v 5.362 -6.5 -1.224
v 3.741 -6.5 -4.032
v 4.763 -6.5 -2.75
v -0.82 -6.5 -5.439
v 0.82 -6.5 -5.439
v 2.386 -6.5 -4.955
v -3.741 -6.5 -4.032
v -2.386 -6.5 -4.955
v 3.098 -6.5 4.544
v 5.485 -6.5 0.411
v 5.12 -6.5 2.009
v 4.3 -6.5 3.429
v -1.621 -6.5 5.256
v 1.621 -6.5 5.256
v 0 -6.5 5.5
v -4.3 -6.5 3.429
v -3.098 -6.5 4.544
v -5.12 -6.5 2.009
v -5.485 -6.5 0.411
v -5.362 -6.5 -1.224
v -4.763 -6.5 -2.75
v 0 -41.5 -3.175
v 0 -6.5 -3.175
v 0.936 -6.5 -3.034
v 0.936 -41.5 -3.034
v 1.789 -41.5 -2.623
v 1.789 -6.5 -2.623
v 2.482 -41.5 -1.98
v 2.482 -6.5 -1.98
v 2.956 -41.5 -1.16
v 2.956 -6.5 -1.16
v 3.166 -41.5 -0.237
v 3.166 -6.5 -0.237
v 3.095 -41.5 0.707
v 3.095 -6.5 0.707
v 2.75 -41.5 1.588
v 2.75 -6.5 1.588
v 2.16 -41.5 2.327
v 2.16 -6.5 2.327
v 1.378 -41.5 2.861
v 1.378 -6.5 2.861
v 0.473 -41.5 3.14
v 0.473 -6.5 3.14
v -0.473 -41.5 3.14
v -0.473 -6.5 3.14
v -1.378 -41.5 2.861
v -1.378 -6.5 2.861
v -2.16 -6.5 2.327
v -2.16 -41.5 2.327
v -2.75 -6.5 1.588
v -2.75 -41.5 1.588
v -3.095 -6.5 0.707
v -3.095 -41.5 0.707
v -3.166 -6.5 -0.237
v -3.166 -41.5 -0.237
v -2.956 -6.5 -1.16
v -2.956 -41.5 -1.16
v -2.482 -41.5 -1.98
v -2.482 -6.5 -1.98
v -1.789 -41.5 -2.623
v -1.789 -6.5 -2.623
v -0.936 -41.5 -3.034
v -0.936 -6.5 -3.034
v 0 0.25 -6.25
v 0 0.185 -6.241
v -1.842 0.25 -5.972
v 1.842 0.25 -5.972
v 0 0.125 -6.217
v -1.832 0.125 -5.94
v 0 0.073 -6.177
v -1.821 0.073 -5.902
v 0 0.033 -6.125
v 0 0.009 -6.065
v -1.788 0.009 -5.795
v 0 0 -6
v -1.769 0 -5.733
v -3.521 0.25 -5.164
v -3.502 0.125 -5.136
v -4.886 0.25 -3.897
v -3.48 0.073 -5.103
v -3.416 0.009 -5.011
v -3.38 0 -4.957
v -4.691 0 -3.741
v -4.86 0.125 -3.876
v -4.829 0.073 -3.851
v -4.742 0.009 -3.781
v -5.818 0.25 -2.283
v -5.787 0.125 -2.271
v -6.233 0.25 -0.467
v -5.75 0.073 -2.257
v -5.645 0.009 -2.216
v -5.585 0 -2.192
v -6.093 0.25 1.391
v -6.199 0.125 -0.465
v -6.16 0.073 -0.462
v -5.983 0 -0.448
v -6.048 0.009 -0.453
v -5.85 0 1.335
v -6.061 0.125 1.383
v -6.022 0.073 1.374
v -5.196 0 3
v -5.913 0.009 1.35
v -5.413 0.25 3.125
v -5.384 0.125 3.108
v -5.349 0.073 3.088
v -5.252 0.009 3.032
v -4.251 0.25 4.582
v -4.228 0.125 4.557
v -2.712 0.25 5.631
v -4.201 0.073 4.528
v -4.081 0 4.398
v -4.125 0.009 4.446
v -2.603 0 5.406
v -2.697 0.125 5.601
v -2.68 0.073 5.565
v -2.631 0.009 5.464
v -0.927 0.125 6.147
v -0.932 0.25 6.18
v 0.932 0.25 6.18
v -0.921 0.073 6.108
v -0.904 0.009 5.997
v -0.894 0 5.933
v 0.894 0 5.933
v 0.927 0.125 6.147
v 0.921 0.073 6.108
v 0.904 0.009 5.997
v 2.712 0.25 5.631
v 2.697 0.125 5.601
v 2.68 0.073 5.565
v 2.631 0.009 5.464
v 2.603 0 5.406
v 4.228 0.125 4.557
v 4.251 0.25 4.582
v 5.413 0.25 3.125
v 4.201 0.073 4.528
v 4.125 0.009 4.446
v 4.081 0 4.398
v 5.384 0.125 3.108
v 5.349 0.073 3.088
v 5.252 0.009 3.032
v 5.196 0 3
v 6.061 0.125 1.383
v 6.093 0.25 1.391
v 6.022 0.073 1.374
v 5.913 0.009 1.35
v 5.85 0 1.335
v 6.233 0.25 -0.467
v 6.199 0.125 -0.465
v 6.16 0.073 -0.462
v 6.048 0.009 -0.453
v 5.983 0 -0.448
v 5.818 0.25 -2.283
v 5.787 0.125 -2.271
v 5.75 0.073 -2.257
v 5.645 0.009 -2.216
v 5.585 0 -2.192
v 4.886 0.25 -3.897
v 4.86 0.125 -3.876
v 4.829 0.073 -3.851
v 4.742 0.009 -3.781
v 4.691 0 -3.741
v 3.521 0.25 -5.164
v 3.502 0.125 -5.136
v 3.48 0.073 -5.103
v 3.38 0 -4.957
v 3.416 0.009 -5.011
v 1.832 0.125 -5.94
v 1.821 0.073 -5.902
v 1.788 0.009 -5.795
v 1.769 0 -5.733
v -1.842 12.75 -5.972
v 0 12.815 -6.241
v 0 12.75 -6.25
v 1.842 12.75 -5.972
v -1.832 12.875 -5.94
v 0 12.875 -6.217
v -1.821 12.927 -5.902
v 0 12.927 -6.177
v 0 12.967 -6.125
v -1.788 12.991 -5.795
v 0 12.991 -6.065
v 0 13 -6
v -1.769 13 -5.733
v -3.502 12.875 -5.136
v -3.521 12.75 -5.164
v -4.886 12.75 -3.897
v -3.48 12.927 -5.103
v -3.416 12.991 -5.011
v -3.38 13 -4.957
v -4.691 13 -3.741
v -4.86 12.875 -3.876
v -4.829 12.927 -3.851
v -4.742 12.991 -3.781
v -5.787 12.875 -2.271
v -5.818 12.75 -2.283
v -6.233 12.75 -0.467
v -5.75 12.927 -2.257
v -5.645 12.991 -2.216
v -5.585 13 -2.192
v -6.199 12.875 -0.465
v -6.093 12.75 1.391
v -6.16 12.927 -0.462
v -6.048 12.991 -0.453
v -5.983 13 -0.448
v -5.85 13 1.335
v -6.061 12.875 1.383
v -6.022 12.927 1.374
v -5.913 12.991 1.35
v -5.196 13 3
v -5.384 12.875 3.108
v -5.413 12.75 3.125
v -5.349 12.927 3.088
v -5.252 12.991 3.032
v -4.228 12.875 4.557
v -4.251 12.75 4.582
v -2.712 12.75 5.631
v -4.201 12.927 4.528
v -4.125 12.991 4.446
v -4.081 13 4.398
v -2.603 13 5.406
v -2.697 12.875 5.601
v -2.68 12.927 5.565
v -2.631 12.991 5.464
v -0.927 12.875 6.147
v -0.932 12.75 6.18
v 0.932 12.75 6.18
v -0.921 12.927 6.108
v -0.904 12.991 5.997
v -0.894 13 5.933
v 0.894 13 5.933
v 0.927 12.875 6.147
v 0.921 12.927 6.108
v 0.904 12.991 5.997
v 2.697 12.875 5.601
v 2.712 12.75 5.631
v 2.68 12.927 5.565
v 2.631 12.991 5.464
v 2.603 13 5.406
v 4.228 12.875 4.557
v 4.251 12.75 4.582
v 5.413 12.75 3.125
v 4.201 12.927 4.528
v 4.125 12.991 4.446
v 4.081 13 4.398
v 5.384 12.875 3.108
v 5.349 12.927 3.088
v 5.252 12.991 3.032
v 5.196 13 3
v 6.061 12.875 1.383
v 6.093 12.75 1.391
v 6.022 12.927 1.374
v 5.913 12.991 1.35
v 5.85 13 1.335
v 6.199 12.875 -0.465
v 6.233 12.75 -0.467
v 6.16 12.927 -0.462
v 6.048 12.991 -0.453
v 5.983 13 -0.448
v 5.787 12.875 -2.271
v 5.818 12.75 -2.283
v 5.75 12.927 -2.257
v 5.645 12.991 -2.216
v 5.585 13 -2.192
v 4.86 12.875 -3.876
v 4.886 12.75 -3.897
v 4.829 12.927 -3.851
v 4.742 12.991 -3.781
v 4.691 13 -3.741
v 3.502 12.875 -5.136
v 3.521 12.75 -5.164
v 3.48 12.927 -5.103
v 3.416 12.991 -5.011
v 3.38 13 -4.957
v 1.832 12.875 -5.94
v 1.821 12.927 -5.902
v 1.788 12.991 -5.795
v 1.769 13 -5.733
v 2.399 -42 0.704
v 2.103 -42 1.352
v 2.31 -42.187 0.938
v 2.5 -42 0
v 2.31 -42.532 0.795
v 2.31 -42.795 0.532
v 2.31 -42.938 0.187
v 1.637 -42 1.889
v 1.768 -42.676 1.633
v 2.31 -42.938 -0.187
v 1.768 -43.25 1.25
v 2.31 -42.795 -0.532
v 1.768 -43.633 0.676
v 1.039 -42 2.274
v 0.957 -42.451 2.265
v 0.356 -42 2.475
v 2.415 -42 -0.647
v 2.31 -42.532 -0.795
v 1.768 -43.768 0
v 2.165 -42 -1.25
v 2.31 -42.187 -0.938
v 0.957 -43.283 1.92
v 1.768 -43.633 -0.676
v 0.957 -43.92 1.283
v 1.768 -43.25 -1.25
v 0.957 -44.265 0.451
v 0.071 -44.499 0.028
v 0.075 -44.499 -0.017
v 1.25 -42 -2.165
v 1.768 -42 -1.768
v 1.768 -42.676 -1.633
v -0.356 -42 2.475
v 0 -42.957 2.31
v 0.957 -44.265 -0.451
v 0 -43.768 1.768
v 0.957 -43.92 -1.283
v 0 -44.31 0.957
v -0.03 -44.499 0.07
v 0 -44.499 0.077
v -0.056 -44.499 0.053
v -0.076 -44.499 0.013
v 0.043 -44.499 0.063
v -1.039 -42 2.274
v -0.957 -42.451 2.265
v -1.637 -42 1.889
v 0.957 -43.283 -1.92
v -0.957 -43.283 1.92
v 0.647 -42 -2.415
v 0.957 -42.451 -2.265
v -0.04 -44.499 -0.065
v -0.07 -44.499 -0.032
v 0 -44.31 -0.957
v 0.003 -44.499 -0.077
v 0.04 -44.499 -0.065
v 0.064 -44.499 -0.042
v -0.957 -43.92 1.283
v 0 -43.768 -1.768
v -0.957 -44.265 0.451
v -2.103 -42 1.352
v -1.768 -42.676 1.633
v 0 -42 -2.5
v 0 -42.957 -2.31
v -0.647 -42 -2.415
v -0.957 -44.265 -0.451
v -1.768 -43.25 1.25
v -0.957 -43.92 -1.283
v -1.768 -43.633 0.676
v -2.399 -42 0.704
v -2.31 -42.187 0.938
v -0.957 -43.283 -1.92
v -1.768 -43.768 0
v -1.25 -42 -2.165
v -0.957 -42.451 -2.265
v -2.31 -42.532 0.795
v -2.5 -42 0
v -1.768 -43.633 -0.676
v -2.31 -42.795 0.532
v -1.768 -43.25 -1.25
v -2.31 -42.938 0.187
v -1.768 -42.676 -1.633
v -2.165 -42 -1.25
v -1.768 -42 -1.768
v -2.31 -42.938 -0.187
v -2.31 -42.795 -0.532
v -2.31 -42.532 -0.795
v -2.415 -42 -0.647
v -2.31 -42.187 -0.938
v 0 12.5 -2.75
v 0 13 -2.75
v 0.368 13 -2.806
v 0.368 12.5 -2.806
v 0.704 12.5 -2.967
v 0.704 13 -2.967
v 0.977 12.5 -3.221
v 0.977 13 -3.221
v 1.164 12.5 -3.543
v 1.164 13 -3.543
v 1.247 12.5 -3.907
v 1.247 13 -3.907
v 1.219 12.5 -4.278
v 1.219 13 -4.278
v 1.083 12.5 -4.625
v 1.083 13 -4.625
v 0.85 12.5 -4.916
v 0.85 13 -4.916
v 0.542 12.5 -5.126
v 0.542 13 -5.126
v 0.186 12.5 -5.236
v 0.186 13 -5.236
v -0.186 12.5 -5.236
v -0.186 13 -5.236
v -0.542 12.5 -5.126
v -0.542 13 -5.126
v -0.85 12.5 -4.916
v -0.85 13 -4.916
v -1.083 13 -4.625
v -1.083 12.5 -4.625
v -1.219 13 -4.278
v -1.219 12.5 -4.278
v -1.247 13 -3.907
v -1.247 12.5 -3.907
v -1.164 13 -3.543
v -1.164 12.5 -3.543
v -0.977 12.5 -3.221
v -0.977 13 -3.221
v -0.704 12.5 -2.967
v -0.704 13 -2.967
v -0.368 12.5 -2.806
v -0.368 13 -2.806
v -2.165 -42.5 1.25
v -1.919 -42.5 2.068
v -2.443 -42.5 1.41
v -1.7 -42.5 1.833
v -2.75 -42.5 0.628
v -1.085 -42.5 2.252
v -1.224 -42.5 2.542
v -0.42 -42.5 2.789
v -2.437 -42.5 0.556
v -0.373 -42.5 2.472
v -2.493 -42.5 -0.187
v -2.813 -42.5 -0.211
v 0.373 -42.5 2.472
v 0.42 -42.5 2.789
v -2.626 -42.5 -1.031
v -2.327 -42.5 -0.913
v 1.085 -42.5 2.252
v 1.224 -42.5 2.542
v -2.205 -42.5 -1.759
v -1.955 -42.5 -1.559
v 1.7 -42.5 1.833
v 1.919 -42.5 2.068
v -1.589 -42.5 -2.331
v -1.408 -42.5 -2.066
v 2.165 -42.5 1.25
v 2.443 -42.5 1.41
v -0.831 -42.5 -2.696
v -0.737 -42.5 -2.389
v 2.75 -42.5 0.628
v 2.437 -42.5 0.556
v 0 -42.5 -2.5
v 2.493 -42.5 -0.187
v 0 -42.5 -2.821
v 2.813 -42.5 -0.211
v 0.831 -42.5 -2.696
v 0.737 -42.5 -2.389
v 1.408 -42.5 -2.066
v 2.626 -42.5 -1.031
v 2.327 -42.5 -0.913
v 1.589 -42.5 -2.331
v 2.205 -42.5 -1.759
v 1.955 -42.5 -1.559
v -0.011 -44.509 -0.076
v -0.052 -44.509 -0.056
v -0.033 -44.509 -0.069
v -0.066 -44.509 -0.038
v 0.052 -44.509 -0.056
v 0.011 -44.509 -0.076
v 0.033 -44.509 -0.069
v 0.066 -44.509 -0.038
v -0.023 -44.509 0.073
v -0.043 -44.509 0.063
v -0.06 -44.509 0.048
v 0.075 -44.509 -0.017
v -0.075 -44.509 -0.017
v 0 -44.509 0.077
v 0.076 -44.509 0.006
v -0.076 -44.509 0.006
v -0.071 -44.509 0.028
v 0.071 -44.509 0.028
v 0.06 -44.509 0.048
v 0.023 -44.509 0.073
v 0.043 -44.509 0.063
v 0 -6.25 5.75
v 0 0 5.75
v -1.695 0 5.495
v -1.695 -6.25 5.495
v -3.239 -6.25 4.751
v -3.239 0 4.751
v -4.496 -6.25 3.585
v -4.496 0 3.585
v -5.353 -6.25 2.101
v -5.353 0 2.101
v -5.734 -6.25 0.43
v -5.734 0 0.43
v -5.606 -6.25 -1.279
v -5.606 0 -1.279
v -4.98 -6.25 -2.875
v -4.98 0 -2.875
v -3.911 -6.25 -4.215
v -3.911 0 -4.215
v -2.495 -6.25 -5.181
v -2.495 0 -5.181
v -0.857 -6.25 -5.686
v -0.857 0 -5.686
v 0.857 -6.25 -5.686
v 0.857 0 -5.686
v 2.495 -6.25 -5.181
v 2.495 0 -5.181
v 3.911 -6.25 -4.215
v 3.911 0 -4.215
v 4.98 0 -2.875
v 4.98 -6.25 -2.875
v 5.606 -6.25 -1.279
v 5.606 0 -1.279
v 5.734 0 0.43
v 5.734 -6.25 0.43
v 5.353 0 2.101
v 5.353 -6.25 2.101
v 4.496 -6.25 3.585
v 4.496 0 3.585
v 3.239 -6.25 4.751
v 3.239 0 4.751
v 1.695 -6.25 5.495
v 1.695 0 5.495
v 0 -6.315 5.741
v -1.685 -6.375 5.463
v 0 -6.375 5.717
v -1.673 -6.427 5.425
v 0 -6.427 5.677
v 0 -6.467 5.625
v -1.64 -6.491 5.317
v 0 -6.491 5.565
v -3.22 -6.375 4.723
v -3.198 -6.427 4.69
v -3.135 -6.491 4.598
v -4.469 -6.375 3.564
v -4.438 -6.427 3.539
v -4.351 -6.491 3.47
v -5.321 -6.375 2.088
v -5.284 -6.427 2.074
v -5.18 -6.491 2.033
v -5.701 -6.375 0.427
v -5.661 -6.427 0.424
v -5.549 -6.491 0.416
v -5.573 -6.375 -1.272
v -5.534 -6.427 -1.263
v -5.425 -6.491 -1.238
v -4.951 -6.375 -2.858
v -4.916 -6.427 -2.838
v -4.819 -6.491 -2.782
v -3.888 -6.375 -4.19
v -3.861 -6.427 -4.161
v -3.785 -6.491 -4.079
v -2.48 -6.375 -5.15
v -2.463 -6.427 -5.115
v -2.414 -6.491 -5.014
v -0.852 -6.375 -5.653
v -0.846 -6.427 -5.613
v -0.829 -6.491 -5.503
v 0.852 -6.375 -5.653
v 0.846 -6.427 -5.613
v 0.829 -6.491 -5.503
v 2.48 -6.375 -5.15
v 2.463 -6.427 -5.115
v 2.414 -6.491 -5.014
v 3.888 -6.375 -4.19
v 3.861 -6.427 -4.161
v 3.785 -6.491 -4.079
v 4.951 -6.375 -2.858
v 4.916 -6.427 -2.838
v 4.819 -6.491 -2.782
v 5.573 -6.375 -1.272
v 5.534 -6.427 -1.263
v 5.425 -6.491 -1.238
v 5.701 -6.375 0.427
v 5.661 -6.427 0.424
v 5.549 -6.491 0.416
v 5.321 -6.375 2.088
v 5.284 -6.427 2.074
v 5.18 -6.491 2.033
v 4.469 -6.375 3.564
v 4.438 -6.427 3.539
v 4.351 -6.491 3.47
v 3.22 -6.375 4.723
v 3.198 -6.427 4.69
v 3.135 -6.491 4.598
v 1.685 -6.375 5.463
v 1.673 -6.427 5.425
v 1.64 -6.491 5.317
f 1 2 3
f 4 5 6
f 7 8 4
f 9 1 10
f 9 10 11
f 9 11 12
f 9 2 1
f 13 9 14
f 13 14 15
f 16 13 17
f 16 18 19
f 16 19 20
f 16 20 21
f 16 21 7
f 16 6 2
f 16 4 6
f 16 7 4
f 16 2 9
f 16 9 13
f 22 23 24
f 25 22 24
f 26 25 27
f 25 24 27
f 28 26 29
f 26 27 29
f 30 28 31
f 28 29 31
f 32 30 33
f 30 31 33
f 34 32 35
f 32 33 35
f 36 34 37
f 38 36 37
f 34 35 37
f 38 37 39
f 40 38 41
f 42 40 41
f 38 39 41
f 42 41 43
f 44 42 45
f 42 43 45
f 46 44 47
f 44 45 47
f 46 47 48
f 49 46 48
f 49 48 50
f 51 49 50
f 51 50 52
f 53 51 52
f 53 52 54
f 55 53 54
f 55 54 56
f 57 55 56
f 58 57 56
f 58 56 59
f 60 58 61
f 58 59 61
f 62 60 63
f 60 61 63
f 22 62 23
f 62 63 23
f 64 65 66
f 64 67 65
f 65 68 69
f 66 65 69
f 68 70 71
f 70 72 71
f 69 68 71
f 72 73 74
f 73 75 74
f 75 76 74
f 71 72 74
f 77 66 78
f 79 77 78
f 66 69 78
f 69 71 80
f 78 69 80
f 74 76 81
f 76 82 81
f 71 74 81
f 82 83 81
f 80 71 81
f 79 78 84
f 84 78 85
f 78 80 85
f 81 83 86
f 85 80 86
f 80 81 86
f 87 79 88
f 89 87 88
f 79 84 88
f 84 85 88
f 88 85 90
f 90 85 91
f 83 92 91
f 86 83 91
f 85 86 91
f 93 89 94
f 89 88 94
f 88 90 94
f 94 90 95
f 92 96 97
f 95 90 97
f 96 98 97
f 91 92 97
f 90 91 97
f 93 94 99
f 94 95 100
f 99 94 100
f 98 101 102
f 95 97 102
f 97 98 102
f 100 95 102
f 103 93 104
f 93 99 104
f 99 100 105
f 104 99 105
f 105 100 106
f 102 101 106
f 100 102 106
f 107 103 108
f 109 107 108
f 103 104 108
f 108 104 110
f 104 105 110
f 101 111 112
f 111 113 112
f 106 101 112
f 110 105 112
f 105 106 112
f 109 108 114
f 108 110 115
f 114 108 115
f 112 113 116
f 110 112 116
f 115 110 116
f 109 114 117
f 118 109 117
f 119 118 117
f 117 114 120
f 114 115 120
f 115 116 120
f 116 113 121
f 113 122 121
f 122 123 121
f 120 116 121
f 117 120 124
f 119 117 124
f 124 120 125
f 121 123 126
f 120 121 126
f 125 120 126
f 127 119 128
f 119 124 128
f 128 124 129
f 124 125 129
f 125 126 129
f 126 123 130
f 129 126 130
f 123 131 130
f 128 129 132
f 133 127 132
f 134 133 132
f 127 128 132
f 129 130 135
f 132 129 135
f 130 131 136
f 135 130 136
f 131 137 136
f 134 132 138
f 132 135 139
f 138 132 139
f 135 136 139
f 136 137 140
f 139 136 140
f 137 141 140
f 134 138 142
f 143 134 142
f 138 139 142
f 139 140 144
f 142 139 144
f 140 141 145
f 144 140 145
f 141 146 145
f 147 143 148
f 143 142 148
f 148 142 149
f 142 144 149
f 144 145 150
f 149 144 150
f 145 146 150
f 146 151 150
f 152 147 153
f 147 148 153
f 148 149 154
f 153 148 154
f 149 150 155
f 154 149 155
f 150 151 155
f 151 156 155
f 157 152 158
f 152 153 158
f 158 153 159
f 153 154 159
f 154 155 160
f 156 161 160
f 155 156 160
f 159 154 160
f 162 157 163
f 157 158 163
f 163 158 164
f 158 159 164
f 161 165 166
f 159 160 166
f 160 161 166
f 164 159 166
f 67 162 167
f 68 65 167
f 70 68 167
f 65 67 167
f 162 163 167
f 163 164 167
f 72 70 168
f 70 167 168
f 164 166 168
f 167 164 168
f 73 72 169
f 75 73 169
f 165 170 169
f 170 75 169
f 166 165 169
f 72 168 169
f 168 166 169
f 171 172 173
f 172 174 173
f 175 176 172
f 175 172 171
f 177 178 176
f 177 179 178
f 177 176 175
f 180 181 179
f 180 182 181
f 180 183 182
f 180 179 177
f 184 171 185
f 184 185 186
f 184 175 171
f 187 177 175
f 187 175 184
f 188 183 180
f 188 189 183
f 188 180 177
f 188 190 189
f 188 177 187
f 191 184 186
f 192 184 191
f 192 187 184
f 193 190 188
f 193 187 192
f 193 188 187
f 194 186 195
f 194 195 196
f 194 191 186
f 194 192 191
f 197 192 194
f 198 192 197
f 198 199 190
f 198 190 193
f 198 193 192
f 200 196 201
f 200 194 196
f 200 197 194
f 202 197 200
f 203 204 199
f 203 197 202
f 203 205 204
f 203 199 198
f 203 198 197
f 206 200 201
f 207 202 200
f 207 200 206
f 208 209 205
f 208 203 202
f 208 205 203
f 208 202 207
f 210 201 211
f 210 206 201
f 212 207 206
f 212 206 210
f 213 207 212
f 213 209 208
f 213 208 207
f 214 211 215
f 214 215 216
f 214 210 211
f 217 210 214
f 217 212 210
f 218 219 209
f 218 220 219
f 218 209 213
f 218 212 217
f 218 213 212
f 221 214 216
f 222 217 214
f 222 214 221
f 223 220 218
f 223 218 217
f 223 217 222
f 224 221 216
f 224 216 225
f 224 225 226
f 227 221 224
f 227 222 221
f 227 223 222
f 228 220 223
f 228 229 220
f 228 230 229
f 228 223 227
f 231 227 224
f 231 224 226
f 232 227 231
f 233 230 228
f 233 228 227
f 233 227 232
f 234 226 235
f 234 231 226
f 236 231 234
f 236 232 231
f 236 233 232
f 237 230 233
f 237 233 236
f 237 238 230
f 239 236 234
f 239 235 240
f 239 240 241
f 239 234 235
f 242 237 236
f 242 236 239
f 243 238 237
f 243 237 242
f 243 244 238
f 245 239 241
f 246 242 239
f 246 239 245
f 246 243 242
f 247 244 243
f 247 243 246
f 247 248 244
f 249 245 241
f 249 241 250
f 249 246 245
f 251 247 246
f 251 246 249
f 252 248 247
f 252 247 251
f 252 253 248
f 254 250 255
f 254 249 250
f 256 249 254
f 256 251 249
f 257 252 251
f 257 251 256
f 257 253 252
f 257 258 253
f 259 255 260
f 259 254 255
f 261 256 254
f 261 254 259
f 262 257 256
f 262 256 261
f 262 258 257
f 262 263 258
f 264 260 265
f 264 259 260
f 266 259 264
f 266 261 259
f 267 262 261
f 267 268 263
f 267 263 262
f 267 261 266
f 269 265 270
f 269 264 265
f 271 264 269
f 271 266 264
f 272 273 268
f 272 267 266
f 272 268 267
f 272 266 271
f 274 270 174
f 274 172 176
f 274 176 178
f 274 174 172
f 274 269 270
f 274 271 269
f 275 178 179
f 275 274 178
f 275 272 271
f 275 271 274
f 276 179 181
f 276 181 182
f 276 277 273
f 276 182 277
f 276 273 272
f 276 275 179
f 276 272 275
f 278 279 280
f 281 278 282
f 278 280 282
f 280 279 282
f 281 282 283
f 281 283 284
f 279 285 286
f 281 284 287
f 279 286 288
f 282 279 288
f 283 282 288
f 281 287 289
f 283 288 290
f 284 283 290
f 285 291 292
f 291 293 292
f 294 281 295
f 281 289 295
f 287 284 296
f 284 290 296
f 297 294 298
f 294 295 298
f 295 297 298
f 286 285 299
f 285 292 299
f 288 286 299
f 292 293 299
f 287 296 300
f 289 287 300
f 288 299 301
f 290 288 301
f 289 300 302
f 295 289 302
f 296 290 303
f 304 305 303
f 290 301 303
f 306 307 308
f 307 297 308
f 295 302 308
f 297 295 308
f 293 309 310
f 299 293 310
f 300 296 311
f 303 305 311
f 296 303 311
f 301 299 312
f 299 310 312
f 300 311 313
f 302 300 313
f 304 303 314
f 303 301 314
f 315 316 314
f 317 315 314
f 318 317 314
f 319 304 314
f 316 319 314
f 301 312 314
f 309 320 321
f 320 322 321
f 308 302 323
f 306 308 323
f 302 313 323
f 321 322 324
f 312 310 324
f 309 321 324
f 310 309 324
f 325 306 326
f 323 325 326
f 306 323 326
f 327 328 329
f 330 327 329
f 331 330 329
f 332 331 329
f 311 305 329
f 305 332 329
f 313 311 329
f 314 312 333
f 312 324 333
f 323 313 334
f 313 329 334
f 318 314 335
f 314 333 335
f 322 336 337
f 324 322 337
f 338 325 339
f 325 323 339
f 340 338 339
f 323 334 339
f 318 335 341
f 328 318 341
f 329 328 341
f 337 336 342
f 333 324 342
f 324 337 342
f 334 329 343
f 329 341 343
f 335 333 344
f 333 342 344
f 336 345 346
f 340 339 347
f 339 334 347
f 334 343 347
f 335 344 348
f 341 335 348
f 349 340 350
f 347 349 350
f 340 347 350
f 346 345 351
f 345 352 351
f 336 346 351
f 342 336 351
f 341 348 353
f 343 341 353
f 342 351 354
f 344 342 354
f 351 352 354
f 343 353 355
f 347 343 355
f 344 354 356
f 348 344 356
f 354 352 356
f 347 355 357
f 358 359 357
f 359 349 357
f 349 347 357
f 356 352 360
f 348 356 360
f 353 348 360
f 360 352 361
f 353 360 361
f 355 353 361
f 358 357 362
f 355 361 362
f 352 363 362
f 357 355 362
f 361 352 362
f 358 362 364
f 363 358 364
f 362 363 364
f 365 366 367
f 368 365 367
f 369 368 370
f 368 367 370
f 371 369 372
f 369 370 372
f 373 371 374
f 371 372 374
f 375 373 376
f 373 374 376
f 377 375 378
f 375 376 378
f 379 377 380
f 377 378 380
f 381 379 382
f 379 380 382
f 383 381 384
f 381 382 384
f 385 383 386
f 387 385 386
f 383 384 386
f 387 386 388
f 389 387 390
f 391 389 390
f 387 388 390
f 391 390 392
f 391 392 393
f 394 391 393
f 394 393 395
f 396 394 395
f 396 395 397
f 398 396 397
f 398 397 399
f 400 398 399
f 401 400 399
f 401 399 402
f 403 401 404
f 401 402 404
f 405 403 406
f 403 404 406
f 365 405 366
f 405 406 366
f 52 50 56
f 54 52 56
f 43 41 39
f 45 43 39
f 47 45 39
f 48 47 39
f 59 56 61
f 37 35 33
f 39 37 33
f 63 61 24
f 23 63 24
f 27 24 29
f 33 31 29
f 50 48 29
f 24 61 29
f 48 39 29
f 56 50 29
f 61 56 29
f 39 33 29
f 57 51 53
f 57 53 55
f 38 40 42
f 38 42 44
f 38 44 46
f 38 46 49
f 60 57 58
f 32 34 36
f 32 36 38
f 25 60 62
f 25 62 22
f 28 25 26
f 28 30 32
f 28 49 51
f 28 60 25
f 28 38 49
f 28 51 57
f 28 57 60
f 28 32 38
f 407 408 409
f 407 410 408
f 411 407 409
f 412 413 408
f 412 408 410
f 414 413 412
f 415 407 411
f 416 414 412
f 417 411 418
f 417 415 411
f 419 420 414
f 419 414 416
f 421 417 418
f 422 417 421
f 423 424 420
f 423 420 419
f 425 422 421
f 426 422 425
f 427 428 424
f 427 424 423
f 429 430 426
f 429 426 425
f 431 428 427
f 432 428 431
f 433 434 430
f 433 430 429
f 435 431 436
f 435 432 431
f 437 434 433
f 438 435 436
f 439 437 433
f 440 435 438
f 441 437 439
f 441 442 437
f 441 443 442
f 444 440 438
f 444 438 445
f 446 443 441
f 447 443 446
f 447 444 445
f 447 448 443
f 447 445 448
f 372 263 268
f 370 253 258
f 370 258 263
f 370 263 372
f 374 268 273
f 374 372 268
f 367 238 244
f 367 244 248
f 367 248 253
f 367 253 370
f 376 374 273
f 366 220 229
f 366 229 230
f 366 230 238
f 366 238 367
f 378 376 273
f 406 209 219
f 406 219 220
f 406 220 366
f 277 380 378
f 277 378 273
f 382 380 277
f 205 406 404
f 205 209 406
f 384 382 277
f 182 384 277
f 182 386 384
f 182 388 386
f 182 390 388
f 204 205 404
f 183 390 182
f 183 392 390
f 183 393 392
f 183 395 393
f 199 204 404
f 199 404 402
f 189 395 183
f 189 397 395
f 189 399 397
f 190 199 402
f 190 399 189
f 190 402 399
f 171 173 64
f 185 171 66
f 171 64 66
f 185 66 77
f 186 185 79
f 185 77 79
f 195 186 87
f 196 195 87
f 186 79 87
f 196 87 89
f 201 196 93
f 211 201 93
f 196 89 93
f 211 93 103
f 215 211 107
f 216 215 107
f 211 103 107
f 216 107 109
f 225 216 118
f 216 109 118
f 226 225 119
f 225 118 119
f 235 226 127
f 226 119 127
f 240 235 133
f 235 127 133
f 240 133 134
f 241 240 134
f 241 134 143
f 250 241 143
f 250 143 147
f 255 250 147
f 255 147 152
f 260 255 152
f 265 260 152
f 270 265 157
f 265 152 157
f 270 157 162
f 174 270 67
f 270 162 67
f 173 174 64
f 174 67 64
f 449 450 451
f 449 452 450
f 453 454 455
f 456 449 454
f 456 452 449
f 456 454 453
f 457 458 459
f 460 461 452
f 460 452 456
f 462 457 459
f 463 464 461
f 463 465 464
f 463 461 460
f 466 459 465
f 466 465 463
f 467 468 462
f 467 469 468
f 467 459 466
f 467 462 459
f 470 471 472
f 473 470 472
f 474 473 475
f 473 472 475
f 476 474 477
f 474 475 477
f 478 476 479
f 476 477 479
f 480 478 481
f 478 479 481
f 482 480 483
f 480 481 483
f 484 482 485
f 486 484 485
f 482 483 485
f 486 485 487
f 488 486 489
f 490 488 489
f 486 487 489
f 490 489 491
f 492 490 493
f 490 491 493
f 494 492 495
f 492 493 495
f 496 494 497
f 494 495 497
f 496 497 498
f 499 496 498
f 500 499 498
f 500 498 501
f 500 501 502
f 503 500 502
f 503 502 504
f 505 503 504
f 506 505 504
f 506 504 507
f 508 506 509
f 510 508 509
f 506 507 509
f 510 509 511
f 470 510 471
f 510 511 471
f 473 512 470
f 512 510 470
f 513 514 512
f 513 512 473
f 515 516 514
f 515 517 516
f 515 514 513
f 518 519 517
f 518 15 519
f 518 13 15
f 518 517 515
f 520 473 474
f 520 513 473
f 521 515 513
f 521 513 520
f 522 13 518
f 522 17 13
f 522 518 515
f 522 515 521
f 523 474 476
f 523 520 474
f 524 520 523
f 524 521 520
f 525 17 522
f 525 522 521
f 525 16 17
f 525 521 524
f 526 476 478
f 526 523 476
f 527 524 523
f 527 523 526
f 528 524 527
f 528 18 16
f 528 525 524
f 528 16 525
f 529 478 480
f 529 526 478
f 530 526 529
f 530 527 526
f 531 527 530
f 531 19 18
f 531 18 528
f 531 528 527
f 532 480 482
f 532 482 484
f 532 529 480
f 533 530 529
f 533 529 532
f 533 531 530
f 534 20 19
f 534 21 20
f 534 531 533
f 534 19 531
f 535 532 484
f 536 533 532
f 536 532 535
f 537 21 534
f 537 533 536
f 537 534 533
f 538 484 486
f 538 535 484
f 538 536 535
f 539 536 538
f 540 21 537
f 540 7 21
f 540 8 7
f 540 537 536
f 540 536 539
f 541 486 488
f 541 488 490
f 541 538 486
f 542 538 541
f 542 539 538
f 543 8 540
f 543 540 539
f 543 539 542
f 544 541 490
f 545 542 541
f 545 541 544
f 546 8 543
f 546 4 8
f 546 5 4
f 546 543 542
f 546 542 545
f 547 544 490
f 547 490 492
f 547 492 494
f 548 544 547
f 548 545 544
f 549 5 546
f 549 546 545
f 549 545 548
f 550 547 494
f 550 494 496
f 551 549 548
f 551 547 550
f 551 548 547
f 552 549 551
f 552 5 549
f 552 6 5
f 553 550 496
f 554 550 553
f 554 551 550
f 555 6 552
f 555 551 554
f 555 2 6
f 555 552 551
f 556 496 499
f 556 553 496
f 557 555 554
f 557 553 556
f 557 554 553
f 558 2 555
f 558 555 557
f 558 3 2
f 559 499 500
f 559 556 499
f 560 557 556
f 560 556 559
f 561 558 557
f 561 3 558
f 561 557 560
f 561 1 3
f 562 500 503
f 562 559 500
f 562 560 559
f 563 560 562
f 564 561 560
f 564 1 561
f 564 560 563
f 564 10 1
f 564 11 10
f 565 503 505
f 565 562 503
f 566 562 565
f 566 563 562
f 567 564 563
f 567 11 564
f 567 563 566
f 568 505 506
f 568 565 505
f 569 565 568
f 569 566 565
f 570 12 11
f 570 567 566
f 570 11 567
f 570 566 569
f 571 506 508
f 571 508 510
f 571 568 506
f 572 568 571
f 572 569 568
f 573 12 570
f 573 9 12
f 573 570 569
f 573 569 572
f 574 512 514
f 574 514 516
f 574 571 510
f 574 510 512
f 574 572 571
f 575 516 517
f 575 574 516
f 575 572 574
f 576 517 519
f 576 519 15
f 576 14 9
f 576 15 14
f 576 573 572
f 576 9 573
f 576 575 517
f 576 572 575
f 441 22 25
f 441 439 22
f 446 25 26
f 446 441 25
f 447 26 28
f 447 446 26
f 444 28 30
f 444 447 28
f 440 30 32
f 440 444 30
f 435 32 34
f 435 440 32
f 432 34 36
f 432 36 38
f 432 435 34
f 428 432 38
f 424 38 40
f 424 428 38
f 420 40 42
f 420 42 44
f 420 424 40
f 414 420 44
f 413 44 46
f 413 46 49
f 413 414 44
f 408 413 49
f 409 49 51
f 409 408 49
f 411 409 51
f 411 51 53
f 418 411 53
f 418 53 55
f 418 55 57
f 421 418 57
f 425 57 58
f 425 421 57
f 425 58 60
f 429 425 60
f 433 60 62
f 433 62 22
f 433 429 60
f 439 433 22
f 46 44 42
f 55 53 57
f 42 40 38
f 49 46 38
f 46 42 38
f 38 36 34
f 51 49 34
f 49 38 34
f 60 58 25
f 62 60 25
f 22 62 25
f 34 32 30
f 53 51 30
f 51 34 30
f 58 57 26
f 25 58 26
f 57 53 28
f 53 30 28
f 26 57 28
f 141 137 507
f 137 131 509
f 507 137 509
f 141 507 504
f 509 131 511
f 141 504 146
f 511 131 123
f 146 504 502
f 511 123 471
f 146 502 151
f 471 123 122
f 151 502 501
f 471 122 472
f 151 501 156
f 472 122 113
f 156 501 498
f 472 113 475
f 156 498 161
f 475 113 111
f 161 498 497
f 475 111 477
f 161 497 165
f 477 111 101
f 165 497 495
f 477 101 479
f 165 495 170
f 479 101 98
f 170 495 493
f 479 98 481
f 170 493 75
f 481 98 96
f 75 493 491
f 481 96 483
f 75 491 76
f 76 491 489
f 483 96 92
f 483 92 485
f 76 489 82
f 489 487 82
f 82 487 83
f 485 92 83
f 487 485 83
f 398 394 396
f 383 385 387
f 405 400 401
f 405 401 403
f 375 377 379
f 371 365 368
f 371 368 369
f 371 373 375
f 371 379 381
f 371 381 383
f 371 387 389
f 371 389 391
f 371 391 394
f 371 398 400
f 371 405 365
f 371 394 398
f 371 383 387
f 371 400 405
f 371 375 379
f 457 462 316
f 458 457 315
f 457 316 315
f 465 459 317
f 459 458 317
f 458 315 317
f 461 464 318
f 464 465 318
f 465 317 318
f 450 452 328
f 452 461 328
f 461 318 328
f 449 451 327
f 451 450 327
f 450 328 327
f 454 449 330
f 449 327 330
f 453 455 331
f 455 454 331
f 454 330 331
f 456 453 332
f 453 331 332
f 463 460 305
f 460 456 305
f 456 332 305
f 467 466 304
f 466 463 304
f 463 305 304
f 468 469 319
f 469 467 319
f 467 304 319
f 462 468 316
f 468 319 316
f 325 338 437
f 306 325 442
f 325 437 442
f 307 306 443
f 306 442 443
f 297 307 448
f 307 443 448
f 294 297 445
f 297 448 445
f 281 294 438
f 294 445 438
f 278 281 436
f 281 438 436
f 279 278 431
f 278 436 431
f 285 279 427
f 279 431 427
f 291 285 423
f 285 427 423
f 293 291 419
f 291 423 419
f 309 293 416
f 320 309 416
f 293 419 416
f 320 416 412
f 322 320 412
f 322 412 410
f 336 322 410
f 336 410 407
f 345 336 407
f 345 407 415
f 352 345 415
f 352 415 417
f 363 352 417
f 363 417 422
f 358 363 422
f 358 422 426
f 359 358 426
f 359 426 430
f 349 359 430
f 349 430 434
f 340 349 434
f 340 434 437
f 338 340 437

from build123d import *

# Parameters (mm, degrees)
SKETCH1_R                    = 6.25
TOP_HEAD_WITH_KNURLING_DEPTH = 13
SKETCH2_R                    = 5.75
FLAT_BOTTOM_OF_HEAD_DEPTH    = 6.5
FILLET1_R                    = 0.25
SKETCH3_R                    = 3.175
SCREW_PIECE_DEPTH            = 35
SKETCH4_R                    = 3.175
DRAFTED_SCREW_END_DEPTH      = 1
DRAFTED_SCREW_END_TAPER      = 19.5
SKETCH6_R                    = 2.5
CUT_EXTRUDE1_DEPTH           = 0.5
REVOLVE3_ANGLE               = 180
SKETCH8_R                    = 1.25
CUT_EXTRUDE2_DEPTH           = 0.5
BOSS_EXTRUDE1_REACH          = 57.706
BOSS_EXTRUDE1_END_RADIUS     = 2.51
SKETCH10_R                   = 0.076631062


with BuildPart() as part:
    # Sketch1 → top head with knurling (new body)
    with BuildSketch(Plane(origin=(0, 0, 0), x_dir=(1, 0, 0), z_dir=(0, 1, 0))):
        with Locations(Location((0, 0, 0), (0, 0, 90))):
            Circle(SKETCH1_R)
    extrude(amount=TOP_HEAD_WITH_KNURLING_DEPTH)

    # Sketch2 → flat bottom of head (add)
    with BuildSketch(Plane.XZ):
        with Locations(Location((0, 0, 0), (0, 0, 90))):
            Circle(SKETCH2_R)
    extrude(amount=FLAT_BOTTOM_OF_HEAD_DEPTH)

    # Fillet1
    fillet1_edges = [part.edges().sort_by_distance(p)[0] for p in [
        (0, 0, 6.25),
        (0, 13, 6.25),
        (0, -6.5, -5.75),
    ]]
    fillet(fillet1_edges, radius=FILLET1_R)

    # Sketch8 → Cut-Extrude2 (cut)
    with BuildSketch(Plane(origin=(0, 13, 0), x_dir=(1, 0, 0), z_dir=(0, 1, 0))):
        with Locations(Location((0, 4, 0), (0, 0, 270))):
            Circle(SKETCH8_R)
    extrude(amount=-CUT_EXTRUDE2_DEPTH, mode=Mode.SUBTRACT)


with BuildPart() as body_2:
    # Sketch3 → screw piece (new body)
    with BuildSketch(Plane.XZ.offset(6.5)):
        with Locations(Location((0, 0, 0), (0, 0, 270))):
            Circle(SKETCH3_R)
    extrude(amount=SCREW_PIECE_DEPTH)


with BuildPart() as body_3:
    # Sketch4 → drafted screw end (new body)
    with BuildSketch(Plane(origin=(0, -41.5, 0), x_dir=(-1, 0, 0), z_dir=(0, -1, 0))):
        with Locations(Location((0, 0, 0), (0, 0, 90))):
            Circle(SKETCH4_R)
    extrude(amount=DRAFTED_SCREW_END_DEPTH, taper=DRAFTED_SCREW_END_TAPER)

    # Sketch6 → Cut-Extrude1 (cut)
    with BuildSketch(Plane.XZ.offset(42.5)):
        with Locations(Location((0, 0, 0), (0, 0, 270))):
            Circle(SKETCH6_R)
    extrude(amount=-CUT_EXTRUDE1_DEPTH, mode=Mode.SUBTRACT)



with BuildPart() as body_4:
    # Sketch7 → Revolve3 (revolve)
    with BuildSketch(Plane(origin=(0, -42, 0), x_dir=(-1, 0, 0), z_dir=(0, -1, 0))):
        with BuildLine():
            Line((2.5, 0), (-2.5, 0))
            ThreePointArc((-2.5, 0), (0, -2.5), (2.5, 0))
        make_face()
    revolve(axis=Axis((-2.5, -42, 0), (1, 0, 0)), revolution_arc=REVOLVE3_ANGLE)


with BuildPart() as body_3_1:
    add(body_3.part)

    add(body_4.part)  # Boss-Extrude1 merges body 4
    # Boss-Extrude1: up to this sphere (the profile starts inside it)
    boss_extrude1_end = Location((0, -42, 0)) * Sphere(BOSS_EXTRUDE1_END_RADIUS, mode=Mode.PRIVATE)
    # Sketch10 → Boss-Extrude1 (add, up to the surface)
    with BuildSketch(Plane.XZ.offset(42), mode=Mode.PRIVATE) as boss_extrude1_sk1:
        with Locations(Location((0, 0, 0), (0, 0, 90))):
            Circle(SKETCH10_R)
    boss_extrude1_tool1 = extrude(boss_extrude1_sk1.sketch, amount=BOSS_EXTRUDE1_REACH, mode=Mode.PRIVATE) & boss_extrude1_end
    add(boss_extrude1_tool1.solids().sort_by_distance((0, -42, 0))[0])


solid = Compound([part.part, body_2.part, body_3_1.part])
